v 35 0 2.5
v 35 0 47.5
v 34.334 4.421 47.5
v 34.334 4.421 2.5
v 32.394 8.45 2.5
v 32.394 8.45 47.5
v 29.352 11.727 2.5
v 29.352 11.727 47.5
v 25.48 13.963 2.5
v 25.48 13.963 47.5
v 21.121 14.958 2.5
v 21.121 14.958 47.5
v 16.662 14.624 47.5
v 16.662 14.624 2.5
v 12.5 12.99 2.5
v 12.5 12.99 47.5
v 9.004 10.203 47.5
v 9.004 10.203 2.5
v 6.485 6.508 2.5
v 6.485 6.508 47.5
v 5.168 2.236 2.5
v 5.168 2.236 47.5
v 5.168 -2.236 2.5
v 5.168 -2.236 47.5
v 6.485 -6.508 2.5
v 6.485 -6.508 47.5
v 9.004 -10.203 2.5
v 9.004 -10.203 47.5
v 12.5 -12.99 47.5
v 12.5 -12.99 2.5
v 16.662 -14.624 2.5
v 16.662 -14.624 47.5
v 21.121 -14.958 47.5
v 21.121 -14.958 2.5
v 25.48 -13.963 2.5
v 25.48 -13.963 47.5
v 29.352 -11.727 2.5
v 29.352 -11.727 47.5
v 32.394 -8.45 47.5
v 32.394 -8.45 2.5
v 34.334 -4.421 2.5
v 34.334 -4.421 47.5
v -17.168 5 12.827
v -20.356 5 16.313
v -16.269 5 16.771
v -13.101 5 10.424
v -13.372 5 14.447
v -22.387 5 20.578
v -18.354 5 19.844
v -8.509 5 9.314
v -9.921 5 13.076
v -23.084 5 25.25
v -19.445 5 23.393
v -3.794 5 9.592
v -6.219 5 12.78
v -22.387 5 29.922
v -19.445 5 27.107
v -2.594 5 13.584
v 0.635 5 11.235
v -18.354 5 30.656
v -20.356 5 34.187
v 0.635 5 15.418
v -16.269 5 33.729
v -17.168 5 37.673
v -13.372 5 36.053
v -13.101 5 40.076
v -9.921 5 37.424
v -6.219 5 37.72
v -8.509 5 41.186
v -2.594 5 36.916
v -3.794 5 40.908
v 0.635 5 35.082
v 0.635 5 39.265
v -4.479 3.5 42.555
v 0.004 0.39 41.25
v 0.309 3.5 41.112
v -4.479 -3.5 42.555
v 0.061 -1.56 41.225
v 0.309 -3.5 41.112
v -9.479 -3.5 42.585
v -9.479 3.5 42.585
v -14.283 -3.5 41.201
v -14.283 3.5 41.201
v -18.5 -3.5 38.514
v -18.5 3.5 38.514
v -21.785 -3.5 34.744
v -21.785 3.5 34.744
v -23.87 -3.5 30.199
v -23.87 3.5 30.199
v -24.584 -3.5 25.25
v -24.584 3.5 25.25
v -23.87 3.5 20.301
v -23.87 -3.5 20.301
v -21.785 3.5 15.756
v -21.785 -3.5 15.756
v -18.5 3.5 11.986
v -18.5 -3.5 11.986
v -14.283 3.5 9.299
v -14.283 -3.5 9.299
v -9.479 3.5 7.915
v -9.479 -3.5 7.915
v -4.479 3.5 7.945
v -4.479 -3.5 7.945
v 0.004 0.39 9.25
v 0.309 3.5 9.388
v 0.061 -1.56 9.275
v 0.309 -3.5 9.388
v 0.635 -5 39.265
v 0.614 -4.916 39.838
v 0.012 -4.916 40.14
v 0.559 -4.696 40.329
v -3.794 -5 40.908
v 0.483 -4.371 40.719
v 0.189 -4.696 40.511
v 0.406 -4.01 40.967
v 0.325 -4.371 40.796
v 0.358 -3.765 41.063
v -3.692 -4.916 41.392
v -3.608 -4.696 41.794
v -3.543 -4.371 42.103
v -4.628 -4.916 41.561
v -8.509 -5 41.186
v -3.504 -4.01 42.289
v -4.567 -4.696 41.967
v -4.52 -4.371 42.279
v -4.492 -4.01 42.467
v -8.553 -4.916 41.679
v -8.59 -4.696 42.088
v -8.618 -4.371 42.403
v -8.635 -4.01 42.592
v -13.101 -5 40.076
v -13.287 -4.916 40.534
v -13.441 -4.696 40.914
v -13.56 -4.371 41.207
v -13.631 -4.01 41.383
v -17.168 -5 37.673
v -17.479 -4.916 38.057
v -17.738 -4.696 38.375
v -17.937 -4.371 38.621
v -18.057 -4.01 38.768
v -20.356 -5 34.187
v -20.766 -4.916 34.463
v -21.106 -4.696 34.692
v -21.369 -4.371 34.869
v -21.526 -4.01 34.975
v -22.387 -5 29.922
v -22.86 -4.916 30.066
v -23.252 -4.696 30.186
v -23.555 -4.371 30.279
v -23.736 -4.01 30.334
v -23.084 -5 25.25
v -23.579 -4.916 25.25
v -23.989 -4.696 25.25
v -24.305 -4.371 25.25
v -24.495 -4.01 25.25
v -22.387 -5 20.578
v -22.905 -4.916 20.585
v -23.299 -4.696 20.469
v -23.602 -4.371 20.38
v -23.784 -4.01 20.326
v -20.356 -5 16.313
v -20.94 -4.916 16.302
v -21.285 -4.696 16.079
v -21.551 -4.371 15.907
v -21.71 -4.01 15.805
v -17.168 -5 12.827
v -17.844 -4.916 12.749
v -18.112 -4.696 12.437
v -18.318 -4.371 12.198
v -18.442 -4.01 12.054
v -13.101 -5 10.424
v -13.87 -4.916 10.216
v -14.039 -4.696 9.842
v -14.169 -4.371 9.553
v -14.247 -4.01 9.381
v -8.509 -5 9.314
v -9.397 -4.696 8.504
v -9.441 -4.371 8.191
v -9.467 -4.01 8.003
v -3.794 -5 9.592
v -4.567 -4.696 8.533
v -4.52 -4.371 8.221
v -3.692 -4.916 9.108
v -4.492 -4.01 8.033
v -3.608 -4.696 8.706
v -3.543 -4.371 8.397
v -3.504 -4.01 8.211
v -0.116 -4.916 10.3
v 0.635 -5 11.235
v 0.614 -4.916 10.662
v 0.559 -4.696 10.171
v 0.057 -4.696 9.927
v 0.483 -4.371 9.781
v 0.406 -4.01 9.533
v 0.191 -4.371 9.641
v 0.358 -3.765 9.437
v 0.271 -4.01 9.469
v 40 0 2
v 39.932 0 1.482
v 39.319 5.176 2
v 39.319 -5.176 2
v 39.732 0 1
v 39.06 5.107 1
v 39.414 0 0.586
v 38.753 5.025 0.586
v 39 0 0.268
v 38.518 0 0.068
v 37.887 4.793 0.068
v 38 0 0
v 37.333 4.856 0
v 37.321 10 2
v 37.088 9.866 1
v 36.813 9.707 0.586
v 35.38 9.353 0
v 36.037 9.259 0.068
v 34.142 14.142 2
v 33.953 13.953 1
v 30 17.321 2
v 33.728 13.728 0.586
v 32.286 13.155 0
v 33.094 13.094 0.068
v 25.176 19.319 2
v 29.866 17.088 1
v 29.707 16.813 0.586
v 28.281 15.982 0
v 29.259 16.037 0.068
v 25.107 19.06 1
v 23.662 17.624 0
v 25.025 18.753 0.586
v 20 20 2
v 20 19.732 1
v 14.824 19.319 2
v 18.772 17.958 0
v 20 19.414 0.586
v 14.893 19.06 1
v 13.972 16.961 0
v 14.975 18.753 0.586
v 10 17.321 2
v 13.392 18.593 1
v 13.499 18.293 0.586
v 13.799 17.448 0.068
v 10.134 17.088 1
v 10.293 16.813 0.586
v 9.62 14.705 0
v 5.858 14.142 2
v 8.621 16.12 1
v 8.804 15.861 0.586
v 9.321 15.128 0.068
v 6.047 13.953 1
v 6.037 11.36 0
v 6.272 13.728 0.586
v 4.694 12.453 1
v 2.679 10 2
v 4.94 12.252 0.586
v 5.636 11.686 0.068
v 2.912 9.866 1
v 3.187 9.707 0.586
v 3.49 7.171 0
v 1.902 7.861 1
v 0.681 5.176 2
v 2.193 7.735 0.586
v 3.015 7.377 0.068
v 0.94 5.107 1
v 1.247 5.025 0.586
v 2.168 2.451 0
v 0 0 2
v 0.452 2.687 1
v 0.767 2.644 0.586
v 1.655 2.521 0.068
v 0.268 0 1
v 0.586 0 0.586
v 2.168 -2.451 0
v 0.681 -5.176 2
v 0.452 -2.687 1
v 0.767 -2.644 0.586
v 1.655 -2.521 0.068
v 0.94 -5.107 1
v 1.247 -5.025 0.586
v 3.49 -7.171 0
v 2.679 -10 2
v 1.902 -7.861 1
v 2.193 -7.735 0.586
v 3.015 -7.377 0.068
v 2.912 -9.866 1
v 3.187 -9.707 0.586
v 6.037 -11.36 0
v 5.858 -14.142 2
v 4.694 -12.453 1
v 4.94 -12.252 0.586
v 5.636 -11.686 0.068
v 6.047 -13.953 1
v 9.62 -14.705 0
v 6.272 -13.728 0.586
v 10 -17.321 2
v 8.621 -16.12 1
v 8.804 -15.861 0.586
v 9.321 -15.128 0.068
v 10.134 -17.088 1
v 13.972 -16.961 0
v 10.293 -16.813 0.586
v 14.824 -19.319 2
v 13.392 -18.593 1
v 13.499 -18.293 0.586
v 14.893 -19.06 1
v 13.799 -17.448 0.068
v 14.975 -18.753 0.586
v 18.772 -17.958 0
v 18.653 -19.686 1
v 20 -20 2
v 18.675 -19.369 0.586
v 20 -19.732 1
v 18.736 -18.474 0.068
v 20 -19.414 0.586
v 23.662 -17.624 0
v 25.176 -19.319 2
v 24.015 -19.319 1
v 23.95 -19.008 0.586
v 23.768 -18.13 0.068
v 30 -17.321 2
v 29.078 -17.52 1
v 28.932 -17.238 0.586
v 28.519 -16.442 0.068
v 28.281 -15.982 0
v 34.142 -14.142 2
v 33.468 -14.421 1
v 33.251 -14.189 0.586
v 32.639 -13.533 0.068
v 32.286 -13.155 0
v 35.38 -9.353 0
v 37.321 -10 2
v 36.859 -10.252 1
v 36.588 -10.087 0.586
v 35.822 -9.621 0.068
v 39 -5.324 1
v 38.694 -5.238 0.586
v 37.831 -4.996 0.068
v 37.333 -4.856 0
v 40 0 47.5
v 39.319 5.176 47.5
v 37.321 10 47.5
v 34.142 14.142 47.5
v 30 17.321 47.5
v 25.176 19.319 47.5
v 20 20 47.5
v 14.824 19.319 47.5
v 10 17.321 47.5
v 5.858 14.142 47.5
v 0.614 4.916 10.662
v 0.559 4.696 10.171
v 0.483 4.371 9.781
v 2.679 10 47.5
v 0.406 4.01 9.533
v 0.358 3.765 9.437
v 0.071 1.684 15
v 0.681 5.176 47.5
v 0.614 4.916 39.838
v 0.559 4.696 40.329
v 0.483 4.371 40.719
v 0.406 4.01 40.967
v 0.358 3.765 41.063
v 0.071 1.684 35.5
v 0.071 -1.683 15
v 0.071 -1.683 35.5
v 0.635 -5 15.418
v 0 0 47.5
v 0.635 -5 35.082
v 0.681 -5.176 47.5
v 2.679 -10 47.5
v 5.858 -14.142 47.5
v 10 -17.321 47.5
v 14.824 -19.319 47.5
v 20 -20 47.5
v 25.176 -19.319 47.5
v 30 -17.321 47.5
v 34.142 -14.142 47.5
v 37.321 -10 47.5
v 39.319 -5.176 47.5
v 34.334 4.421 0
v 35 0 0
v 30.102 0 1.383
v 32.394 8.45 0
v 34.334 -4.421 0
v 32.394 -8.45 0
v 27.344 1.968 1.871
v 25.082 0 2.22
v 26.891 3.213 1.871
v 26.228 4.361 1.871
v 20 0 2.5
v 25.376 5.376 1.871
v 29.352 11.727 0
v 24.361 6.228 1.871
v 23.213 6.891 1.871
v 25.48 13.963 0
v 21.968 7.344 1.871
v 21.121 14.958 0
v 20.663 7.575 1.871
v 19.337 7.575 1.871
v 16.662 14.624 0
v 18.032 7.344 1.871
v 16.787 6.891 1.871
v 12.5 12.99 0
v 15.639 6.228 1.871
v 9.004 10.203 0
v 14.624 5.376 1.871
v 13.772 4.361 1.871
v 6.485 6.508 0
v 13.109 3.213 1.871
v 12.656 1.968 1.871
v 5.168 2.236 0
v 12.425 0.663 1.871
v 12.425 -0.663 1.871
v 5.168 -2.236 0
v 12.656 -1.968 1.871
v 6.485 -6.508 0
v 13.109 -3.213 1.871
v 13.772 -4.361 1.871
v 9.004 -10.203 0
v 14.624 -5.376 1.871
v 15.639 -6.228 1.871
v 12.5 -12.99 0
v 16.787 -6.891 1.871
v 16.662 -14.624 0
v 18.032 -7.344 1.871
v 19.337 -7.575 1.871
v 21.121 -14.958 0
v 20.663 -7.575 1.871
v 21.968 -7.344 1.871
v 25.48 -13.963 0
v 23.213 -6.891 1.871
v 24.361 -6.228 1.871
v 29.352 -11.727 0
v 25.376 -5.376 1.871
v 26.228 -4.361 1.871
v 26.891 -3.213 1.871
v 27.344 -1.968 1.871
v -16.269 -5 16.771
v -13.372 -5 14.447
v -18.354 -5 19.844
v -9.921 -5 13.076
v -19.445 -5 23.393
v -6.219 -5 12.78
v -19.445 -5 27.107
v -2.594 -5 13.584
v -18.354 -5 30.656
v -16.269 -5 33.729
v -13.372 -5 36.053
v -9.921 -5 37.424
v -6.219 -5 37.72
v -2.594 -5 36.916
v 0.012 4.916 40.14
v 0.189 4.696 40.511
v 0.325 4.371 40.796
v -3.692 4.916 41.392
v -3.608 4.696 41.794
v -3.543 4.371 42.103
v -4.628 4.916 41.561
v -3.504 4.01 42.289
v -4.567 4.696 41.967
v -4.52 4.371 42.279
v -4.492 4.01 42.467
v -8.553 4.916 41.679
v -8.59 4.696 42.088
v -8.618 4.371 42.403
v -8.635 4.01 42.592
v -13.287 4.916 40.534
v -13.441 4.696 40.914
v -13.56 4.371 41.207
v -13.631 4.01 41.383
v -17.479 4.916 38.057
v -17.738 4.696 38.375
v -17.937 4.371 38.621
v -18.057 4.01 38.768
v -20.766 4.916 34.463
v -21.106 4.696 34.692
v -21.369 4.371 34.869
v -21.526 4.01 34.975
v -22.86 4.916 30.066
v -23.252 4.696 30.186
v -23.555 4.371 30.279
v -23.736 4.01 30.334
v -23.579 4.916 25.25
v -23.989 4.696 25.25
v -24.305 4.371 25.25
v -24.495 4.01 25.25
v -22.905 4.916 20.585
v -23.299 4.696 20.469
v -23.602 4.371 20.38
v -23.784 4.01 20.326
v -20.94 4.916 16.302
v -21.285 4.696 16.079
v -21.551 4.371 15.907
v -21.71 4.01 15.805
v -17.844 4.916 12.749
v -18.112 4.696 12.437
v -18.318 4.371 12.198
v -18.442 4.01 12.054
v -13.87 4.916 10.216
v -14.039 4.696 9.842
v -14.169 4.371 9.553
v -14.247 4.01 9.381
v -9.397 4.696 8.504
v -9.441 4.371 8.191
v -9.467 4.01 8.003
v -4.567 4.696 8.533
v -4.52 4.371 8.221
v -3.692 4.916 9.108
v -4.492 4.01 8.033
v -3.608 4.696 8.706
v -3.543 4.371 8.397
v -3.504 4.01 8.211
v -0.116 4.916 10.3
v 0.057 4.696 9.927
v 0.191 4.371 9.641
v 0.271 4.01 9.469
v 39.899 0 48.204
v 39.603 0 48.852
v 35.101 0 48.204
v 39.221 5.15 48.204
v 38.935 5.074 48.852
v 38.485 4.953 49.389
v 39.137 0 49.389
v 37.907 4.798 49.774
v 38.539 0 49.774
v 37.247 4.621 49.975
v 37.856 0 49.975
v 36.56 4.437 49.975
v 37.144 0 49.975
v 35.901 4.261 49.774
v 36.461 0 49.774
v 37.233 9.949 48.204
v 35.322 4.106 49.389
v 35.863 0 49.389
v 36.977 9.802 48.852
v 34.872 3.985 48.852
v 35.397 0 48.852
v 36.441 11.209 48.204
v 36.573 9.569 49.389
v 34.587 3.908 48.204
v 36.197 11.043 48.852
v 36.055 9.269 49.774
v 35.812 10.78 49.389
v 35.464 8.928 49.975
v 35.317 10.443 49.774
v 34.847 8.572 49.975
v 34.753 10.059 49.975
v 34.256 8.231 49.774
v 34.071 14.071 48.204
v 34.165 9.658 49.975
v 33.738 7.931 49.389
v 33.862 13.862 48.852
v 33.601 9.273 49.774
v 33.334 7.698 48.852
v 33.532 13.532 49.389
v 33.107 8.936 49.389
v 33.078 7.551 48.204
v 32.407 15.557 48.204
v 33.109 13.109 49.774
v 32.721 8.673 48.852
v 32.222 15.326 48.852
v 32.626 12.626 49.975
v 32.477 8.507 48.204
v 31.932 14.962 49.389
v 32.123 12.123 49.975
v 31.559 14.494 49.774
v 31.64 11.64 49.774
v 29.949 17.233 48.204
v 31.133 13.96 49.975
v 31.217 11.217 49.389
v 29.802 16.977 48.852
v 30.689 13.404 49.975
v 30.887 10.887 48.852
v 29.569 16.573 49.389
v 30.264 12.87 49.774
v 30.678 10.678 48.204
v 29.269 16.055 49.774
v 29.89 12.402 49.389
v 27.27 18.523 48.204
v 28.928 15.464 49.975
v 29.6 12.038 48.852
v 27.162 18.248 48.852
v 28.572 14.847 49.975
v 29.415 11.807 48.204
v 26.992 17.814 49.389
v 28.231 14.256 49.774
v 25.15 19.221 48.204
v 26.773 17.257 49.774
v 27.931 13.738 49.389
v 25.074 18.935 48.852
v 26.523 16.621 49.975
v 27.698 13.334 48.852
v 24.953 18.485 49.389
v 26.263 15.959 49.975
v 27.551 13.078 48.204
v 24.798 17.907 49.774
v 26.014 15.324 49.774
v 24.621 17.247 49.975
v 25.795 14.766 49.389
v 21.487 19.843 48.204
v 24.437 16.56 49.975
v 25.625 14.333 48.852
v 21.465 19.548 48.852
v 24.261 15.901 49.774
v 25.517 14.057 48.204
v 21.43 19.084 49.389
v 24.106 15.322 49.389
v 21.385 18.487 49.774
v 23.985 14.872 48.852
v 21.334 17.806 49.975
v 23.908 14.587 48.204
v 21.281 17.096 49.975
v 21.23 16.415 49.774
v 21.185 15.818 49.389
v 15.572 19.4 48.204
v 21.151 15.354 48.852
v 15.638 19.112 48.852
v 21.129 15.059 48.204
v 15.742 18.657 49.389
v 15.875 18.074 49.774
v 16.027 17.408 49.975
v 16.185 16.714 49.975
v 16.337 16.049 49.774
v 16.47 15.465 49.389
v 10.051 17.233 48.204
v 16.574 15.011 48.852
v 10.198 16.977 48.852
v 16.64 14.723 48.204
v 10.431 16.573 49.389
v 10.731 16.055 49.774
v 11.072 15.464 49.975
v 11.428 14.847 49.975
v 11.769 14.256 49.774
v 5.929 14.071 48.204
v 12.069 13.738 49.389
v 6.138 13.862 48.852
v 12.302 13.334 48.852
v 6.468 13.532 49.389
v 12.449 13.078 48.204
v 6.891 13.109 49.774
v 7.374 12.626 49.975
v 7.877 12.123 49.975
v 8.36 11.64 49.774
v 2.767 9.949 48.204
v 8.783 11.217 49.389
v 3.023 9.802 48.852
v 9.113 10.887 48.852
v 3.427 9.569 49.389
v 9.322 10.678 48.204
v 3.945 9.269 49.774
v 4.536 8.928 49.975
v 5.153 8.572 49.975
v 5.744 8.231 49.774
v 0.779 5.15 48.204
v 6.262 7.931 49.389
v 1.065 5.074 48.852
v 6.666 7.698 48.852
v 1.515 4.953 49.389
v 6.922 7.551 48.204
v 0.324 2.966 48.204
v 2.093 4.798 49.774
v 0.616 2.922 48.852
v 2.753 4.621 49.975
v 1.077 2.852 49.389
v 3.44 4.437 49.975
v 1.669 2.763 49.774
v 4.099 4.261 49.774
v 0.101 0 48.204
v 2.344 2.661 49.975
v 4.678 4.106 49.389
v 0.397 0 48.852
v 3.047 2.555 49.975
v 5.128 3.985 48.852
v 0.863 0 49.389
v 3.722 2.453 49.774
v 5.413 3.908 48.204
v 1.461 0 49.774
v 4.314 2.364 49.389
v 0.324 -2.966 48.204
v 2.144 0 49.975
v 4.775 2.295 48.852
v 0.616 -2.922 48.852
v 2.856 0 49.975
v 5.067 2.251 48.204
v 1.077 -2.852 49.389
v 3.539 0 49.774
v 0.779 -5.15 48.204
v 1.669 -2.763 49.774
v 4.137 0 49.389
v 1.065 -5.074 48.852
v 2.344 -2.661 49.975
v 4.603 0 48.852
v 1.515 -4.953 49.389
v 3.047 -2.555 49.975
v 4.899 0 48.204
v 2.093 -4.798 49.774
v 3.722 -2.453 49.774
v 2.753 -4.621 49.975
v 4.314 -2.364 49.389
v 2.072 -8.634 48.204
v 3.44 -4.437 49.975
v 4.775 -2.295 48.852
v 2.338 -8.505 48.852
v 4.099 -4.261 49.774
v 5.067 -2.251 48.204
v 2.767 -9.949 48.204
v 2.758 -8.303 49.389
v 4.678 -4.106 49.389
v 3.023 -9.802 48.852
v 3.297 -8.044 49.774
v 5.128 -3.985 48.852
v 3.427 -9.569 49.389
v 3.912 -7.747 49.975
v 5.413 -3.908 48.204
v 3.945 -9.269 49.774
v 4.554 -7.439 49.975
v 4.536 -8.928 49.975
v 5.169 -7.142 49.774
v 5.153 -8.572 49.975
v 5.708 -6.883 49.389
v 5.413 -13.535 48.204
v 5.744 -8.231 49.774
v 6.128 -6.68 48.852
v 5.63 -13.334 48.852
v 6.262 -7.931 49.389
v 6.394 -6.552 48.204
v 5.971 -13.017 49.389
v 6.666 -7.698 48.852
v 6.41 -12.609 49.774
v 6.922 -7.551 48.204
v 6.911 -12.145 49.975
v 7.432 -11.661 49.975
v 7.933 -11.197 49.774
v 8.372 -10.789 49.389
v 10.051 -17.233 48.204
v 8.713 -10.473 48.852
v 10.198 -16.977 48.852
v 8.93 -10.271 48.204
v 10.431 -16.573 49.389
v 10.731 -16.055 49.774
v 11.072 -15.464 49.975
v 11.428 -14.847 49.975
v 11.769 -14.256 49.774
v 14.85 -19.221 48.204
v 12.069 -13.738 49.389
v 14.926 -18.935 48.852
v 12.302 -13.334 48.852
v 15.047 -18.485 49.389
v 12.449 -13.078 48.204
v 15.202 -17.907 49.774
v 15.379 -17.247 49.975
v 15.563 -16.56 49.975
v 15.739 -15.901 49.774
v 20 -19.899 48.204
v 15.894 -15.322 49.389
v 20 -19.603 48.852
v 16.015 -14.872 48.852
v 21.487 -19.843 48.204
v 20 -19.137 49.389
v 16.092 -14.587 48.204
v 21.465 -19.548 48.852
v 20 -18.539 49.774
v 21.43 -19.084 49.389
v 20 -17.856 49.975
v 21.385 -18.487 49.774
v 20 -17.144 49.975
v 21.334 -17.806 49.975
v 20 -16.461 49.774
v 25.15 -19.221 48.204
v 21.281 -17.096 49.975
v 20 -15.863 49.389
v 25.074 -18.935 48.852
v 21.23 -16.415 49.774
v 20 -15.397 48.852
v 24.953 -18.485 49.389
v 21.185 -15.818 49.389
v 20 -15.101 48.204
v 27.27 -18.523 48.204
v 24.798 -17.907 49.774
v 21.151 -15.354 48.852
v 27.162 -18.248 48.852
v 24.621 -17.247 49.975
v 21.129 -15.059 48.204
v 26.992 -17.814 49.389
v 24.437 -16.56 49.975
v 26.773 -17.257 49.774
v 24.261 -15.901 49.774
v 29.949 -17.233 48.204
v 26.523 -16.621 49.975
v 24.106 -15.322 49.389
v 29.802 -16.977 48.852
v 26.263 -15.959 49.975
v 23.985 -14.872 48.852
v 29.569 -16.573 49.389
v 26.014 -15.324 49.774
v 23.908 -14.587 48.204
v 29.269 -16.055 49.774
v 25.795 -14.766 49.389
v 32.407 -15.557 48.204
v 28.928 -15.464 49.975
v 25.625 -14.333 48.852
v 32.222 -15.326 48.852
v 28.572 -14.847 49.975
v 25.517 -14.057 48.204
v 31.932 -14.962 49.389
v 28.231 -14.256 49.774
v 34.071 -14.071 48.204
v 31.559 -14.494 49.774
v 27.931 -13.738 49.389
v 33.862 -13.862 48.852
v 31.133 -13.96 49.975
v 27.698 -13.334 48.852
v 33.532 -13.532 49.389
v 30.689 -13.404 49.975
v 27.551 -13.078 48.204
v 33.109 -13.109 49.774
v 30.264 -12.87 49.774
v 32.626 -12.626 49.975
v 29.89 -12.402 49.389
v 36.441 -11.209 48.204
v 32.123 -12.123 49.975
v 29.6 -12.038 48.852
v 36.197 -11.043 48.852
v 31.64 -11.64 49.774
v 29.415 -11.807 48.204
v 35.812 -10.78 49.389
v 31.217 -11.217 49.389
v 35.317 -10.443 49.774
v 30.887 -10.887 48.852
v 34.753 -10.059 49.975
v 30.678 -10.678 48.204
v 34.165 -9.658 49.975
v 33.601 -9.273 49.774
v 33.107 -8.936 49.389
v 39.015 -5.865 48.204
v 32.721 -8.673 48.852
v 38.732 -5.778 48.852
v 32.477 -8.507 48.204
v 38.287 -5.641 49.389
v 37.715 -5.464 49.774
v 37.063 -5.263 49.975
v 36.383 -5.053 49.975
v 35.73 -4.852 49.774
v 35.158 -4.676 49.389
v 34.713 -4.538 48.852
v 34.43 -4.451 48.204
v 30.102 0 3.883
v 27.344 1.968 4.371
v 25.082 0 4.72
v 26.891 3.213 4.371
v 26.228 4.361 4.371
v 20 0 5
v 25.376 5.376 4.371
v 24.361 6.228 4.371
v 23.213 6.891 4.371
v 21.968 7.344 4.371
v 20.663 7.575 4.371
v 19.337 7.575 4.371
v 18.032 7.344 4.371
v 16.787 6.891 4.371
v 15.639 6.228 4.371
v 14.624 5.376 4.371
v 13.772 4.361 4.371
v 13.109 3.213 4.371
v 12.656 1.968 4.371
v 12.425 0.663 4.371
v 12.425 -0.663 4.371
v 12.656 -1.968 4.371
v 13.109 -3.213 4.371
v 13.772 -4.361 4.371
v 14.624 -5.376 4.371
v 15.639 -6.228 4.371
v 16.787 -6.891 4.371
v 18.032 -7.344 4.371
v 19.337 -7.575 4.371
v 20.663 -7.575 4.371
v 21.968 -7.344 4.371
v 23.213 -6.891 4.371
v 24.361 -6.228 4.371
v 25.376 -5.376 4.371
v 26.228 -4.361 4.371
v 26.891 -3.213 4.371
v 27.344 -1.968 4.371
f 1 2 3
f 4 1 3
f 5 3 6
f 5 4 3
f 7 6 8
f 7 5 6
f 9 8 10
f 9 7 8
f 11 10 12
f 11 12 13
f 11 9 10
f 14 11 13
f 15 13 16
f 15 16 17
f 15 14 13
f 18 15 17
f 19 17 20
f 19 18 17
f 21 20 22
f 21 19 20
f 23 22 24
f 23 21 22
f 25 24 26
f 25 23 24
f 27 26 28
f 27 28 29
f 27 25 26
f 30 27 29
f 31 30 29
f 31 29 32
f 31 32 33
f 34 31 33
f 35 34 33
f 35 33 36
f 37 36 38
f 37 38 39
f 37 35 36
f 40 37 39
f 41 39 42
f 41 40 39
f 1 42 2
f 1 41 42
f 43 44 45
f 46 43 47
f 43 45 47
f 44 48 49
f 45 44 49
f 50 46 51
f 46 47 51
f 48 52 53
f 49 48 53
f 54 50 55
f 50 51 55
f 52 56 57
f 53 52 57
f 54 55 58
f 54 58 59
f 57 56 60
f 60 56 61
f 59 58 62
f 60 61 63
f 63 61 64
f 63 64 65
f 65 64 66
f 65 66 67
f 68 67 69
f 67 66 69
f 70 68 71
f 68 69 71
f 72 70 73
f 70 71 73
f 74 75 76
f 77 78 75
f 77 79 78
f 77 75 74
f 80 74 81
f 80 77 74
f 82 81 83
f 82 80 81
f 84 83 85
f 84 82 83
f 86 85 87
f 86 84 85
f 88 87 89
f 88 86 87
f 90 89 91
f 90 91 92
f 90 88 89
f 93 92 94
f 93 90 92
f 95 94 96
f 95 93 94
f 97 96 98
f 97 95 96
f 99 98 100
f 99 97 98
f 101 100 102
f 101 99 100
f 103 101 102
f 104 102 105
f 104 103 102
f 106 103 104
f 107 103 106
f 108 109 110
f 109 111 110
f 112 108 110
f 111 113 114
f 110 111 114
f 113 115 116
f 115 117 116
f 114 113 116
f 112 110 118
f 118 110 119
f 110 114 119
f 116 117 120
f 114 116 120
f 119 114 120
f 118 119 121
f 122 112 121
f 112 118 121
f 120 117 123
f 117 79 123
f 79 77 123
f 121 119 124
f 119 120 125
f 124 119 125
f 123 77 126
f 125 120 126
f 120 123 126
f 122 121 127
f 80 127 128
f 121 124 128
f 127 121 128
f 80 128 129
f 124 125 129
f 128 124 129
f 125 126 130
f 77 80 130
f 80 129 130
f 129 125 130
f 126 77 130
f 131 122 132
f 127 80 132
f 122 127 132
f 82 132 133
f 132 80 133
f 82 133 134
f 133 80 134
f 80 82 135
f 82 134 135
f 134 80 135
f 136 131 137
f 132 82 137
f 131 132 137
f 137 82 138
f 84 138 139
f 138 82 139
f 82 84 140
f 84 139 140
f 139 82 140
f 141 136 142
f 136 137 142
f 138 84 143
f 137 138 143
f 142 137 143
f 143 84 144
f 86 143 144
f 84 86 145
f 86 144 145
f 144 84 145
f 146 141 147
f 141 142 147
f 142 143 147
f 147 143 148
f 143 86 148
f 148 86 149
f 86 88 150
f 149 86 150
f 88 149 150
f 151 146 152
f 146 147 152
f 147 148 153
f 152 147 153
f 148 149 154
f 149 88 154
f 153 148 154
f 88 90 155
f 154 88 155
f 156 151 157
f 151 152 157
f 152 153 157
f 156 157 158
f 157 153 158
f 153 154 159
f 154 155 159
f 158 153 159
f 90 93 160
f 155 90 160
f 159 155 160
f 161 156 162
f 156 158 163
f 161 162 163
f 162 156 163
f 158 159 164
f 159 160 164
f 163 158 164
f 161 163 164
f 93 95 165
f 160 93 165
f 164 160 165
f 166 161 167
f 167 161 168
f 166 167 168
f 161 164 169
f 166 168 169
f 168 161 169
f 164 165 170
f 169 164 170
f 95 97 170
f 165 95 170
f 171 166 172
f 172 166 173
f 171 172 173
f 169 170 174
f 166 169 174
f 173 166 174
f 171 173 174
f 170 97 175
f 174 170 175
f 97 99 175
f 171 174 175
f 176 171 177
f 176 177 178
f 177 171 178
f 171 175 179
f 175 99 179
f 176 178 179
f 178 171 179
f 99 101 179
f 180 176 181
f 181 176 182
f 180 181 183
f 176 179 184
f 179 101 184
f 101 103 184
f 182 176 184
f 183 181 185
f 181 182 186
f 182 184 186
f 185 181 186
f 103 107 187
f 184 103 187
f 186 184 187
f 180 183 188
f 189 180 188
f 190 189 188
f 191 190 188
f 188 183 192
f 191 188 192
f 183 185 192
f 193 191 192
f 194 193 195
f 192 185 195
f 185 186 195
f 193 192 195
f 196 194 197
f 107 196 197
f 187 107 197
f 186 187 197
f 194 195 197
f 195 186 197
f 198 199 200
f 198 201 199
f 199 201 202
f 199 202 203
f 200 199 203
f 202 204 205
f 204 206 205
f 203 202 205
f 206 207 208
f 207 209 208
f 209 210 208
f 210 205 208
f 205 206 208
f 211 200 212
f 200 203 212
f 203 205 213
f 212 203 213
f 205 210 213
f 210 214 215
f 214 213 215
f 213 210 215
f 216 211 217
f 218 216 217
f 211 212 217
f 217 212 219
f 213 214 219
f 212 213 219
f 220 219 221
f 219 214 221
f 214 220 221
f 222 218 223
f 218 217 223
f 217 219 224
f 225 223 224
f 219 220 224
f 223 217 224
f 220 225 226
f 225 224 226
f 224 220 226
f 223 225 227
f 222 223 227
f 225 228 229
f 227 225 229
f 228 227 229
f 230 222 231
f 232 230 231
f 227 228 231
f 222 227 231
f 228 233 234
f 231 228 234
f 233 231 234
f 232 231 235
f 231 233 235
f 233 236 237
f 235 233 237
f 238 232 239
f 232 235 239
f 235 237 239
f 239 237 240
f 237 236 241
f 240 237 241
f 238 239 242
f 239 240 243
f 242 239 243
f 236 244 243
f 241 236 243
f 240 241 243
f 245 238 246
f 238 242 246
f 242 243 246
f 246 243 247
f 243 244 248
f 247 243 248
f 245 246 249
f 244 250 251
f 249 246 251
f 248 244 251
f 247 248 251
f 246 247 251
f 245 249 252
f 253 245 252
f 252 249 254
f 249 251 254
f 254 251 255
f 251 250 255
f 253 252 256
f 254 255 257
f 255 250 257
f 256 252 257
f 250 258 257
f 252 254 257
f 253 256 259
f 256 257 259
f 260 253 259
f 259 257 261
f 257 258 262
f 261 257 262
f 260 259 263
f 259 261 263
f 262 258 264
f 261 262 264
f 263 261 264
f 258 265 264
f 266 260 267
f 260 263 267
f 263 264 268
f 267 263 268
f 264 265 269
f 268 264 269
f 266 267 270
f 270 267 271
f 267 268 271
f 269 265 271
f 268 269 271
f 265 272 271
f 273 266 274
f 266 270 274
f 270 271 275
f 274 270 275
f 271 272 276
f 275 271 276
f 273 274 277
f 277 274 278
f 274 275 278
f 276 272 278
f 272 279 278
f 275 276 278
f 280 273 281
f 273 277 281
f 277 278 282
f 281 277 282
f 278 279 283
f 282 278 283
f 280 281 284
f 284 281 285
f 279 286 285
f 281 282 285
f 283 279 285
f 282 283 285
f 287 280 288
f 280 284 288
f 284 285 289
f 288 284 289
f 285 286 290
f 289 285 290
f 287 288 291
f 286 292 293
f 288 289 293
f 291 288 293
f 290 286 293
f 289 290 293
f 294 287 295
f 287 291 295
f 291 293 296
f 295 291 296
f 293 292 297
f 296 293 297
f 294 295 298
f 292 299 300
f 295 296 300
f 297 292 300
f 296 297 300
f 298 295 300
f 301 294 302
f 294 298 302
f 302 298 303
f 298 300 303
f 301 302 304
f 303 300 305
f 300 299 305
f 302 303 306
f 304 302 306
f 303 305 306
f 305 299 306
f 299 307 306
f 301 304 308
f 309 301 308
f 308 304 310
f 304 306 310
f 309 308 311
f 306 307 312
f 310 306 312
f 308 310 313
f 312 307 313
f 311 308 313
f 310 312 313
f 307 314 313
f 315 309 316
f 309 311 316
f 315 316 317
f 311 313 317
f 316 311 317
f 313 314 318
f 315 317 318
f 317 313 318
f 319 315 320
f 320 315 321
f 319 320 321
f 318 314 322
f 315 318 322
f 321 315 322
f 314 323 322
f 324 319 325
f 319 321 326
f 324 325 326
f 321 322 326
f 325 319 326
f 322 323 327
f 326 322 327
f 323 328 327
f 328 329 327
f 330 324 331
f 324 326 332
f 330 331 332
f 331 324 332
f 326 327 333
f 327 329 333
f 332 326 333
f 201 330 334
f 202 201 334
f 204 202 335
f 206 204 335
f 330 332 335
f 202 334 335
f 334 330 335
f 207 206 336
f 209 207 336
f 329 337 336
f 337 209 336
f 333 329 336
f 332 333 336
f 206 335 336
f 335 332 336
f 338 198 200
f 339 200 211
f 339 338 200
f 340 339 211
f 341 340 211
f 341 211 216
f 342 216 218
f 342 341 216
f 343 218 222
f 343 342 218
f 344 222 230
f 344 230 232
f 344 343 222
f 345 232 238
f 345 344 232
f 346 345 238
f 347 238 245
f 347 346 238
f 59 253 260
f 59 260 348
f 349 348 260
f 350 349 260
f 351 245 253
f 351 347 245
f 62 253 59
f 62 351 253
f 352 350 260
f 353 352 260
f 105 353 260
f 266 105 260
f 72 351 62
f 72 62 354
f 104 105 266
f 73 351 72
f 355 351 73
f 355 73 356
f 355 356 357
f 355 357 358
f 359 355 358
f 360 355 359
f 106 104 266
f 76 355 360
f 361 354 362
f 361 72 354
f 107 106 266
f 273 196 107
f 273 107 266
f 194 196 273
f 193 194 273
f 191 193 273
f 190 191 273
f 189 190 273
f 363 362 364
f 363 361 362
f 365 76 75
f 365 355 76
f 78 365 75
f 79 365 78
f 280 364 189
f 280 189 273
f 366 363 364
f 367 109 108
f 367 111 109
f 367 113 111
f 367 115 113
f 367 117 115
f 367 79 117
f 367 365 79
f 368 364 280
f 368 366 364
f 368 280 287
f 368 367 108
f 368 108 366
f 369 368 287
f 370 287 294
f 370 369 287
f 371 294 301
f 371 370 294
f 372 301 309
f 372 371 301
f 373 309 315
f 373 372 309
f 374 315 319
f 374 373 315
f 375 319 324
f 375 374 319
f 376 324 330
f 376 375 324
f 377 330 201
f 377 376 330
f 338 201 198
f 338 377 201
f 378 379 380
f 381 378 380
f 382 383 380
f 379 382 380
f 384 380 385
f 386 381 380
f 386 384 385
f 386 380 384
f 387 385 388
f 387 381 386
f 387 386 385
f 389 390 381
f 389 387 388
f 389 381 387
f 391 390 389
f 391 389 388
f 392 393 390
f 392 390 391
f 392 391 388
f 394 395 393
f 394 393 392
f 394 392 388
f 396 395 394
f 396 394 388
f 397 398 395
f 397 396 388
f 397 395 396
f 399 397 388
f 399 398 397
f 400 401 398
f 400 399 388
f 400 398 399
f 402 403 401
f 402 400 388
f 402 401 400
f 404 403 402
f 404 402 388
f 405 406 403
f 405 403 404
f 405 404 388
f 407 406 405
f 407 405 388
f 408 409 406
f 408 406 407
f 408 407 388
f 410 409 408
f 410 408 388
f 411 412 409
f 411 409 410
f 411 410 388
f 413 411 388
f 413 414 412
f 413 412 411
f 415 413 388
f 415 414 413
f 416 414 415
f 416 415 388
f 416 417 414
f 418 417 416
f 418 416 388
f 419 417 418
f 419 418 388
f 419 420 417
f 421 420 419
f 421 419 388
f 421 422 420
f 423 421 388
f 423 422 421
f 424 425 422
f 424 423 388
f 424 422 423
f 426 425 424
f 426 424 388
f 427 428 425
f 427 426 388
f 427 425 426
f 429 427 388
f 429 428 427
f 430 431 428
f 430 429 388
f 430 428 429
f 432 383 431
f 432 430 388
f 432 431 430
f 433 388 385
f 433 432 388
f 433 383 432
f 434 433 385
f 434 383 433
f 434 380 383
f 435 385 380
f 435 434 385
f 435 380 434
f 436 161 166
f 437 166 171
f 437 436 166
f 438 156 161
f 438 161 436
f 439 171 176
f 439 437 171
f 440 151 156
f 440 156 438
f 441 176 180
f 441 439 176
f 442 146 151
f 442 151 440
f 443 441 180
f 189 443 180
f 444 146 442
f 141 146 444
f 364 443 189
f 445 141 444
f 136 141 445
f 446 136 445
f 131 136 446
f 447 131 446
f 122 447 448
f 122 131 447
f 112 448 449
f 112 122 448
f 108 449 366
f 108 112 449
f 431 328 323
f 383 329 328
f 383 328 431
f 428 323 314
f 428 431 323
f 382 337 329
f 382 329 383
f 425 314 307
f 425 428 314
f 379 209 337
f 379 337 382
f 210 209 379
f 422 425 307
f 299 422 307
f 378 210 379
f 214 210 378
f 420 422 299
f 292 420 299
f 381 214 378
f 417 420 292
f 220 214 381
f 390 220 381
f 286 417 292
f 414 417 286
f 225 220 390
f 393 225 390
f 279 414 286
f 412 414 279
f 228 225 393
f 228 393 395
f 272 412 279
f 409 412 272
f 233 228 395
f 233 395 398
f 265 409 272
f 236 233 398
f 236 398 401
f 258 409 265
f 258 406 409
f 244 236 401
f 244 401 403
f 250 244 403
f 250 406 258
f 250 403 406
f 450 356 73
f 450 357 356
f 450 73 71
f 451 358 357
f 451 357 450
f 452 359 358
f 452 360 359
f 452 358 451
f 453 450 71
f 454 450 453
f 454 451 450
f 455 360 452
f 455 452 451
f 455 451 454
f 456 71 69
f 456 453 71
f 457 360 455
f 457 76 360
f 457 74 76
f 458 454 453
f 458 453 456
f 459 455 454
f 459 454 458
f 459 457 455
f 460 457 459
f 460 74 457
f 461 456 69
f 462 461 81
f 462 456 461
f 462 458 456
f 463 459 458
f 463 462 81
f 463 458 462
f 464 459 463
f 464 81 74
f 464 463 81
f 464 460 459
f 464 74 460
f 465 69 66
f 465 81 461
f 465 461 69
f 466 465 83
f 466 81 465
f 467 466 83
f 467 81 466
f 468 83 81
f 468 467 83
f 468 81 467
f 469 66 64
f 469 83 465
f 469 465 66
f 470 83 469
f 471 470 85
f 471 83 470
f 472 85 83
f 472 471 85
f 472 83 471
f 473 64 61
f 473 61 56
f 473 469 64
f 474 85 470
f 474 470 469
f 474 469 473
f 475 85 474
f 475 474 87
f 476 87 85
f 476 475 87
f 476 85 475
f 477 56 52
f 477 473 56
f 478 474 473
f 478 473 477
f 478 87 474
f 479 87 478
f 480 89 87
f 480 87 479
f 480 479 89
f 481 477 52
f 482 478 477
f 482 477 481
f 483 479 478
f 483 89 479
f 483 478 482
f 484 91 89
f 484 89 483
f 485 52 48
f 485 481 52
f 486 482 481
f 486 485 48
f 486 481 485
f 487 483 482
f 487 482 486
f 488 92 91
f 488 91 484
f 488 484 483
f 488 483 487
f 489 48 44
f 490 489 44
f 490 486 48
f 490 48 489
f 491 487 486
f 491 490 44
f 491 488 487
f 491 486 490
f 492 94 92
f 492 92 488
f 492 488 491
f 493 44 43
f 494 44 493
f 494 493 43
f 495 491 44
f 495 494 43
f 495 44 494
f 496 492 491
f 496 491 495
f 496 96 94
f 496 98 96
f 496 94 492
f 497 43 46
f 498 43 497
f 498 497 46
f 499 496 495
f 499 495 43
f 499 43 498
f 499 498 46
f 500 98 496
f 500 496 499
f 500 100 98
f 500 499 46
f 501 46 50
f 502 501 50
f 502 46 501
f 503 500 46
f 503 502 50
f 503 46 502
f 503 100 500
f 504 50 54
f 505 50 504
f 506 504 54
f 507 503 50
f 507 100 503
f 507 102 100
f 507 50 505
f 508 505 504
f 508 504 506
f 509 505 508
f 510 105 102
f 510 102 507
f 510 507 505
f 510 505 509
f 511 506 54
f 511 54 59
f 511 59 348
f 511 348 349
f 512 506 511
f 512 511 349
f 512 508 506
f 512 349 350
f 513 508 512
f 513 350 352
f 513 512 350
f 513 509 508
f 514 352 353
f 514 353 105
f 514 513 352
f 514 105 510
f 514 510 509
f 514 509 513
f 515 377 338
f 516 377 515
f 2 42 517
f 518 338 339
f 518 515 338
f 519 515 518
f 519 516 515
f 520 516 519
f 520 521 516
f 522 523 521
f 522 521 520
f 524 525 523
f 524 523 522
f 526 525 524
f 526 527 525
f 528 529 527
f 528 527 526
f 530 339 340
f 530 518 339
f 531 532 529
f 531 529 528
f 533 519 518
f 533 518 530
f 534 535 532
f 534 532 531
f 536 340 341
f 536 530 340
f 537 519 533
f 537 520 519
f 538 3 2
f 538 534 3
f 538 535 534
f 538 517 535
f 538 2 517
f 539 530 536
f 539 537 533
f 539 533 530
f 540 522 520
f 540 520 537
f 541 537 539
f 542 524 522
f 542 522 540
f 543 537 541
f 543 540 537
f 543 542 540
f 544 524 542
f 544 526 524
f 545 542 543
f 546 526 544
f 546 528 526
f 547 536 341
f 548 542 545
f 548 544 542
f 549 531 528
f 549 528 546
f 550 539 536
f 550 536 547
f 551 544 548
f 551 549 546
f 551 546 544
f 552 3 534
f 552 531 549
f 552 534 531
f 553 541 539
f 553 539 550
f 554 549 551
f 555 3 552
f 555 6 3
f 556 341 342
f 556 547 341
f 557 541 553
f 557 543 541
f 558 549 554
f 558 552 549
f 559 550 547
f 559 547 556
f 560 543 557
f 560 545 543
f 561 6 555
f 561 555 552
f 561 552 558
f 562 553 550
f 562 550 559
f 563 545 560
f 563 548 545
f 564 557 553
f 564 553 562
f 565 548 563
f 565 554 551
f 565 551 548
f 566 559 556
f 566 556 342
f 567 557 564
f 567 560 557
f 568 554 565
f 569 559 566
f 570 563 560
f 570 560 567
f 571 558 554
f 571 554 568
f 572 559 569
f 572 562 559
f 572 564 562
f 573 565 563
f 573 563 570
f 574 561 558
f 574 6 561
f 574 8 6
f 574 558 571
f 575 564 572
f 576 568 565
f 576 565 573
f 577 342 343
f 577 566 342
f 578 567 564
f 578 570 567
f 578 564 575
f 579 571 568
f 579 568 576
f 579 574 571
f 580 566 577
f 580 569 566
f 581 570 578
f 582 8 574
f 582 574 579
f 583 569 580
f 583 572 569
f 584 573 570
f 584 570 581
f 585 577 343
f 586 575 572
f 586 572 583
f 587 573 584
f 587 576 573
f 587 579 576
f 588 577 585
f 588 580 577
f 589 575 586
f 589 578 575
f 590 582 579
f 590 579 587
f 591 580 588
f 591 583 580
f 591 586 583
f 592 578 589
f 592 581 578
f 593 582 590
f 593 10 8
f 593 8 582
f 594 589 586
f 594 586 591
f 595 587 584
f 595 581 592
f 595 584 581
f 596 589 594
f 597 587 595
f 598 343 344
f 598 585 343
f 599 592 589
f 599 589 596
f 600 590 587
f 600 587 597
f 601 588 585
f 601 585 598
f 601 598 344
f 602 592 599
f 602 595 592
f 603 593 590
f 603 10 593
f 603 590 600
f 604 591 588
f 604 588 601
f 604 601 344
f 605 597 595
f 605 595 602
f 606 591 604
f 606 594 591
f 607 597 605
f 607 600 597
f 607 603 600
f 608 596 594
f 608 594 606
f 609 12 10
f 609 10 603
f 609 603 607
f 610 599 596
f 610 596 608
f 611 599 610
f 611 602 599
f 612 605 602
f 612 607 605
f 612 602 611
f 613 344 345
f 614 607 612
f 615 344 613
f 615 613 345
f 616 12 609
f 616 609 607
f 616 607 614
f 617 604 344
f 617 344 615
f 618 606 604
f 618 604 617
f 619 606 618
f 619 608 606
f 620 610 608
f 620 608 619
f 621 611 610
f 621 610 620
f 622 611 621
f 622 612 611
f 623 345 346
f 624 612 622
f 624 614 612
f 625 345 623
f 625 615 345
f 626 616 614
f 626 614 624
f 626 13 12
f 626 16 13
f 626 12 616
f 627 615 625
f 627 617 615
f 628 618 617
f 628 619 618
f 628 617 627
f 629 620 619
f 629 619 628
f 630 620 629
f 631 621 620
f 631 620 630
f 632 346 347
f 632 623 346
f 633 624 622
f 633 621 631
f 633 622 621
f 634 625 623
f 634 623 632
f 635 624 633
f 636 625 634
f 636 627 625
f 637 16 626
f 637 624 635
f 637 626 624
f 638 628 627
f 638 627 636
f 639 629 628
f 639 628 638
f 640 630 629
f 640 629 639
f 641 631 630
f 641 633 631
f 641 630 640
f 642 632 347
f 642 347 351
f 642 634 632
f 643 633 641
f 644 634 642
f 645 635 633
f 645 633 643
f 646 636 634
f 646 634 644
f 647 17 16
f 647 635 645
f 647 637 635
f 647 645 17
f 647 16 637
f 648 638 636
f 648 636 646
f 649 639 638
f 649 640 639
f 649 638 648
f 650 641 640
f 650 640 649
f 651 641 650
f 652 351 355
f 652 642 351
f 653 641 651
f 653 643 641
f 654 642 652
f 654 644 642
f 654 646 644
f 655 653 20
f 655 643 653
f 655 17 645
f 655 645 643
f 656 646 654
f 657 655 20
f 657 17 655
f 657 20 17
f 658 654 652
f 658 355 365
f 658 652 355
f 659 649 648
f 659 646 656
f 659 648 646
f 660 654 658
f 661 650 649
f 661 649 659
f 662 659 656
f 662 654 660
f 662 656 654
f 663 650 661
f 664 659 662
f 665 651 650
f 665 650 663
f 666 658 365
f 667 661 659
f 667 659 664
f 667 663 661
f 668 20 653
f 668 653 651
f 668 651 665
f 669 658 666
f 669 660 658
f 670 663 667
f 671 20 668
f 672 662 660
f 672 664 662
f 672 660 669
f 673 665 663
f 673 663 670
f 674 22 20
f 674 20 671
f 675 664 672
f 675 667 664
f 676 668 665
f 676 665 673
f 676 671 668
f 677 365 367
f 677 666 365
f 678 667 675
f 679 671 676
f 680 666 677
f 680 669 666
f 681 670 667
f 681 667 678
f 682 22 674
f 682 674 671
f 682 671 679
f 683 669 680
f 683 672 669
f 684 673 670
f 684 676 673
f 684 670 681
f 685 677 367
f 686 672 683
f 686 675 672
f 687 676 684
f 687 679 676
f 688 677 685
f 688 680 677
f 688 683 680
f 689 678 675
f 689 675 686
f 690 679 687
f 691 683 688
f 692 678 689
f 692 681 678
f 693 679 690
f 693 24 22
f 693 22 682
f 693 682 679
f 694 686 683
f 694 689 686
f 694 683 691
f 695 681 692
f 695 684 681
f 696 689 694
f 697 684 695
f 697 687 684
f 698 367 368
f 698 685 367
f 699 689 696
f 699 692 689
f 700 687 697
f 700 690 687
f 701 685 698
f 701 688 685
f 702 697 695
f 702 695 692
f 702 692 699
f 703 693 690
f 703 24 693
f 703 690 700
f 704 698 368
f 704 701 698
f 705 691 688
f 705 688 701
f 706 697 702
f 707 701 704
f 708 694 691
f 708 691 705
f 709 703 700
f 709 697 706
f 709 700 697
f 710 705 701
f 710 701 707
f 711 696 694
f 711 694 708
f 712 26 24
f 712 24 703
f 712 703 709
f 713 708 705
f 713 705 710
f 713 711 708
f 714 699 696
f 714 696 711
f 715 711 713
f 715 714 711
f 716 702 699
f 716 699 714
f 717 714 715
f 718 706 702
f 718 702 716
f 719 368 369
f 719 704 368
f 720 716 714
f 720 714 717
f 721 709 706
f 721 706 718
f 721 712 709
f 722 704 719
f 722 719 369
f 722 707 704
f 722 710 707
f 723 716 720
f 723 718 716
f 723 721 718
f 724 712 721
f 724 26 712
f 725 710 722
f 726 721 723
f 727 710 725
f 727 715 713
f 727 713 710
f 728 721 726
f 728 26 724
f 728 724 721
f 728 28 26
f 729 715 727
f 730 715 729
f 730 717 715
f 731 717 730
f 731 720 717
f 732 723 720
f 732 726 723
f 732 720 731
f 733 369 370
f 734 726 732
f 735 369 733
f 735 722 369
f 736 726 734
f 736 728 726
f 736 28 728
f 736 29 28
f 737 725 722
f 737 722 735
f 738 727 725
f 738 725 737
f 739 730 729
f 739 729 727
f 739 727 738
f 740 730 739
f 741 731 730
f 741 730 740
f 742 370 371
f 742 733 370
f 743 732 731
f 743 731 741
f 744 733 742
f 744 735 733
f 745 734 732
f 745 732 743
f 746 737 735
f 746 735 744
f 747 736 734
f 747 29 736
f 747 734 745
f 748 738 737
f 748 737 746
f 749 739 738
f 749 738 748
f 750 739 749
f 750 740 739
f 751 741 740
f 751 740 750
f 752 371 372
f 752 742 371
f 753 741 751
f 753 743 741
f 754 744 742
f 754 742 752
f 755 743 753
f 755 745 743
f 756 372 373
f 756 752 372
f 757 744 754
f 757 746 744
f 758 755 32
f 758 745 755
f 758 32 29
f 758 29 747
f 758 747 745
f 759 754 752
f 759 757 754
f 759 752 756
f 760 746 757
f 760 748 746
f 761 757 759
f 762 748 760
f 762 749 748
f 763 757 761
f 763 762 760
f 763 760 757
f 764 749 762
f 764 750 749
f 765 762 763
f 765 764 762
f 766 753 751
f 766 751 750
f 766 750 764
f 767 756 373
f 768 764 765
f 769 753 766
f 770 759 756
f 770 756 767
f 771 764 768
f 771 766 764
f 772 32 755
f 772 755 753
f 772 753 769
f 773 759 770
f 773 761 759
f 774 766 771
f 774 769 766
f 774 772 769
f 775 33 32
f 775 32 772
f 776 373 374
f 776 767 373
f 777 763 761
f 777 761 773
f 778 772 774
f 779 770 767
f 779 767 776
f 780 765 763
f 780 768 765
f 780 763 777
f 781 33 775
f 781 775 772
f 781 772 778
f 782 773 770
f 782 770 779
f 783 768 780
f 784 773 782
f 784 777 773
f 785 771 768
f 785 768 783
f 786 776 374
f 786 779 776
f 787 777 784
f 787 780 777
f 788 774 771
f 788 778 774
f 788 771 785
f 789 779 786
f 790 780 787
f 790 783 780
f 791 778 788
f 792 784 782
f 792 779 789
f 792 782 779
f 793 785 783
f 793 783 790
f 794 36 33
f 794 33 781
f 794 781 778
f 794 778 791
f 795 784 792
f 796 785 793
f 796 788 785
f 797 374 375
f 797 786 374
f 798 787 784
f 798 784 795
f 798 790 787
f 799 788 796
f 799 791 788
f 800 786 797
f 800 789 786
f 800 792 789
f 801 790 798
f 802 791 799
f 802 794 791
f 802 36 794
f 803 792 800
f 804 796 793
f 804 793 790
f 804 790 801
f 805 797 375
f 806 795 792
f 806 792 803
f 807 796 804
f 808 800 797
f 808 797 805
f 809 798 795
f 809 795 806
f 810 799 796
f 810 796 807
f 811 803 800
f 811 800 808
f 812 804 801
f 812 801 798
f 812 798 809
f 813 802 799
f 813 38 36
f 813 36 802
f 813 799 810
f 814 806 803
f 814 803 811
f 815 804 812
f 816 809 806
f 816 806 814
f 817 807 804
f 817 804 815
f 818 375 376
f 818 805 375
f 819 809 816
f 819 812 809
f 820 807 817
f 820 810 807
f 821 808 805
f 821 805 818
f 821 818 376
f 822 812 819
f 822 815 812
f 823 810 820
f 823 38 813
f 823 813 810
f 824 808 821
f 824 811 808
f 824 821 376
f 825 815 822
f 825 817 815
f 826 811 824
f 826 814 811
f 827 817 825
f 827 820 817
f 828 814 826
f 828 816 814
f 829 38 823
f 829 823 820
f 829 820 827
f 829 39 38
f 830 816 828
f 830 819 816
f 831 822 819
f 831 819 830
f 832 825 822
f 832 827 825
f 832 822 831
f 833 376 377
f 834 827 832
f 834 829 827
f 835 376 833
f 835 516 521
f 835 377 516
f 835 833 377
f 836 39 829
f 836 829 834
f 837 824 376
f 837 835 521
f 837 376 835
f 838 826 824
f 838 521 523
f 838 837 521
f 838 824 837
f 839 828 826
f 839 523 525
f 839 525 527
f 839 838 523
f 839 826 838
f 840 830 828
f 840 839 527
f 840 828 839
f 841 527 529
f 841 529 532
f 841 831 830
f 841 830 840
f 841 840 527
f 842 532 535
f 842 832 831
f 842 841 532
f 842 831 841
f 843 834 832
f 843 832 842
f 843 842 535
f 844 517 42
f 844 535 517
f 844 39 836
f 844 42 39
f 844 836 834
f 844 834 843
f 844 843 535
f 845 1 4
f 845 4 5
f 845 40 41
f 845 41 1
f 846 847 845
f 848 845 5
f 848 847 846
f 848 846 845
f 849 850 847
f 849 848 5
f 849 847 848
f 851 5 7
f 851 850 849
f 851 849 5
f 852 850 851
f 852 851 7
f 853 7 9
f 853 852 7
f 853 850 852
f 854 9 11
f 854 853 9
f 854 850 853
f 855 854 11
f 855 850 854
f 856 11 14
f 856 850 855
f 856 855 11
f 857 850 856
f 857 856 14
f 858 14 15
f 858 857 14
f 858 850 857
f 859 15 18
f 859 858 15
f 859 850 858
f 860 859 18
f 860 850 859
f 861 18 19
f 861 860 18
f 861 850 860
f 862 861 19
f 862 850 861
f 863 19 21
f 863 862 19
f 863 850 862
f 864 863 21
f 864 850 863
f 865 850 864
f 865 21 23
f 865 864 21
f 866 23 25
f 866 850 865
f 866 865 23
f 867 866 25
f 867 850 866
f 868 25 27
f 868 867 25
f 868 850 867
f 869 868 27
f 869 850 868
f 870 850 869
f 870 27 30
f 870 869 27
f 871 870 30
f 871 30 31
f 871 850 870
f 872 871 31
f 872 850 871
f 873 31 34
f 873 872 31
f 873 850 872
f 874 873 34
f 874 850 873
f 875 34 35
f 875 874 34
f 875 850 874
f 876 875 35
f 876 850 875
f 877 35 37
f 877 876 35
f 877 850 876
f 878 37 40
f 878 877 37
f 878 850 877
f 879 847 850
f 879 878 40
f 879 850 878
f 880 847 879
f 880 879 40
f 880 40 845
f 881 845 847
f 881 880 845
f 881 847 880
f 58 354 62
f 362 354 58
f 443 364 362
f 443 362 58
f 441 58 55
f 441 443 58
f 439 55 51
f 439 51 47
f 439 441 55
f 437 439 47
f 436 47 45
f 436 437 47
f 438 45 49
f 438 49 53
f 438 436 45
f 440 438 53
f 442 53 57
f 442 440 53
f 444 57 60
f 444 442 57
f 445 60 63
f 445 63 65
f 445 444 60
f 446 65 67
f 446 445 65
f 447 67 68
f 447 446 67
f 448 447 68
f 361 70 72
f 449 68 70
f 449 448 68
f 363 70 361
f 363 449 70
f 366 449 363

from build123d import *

# Parameters (mm, degrees)
F3_DEPTH = 5
F4_R     = 1.5
F5_R     = 2


# Not quite as in the source:
# - a feature names something its author has since deleted; it is built from what else it names


with BuildPart() as f1:
    # F0 (on Front) → F1 (revolve)
    with BuildSketch(Plane.XZ):
        Polygon((35, 0), (40, 0), (40, 47.5), (35, 47.5), (35, 2.5), align=None)
        with BuildLine():
            Line((35, 47.5), (40, 47.5))
            ThreePointArc((40, 47.5), (37.5, 50), (35, 47.5))
        make_face()
        with BuildLine():
            ThreePointArc((20, 2.5), (27.6034531629, 1.8707189772), (35, 0))
            Line((35, 0), (35, 2.5))
            ThreePointArc((35, 2.5), (27.6034531629, 4.3707189772), (20, 5))
            Line((20, 5), (20, 2.5))
        make_face()
    revolve(axis=Axis((20, 0, 1.25), (0, 0, 1)))

    # F2 (on Front) → F3 (join, symmetric)
    with BuildSketch(Plane.XZ):
        with BuildLine():
            ThreePointArc((1.5, 16.1636090773), (-19.5841423567, 25.25), (1.5, 34.3363909227))
            Line((1.5, 34.3363909227), (1.5, 40.5))
            ThreePointArc((1.5, 40.5), (-24.5841423567, 25.25), (1.5, 10))
            Line((1.5, 10), (1.5, 16.1636090773))
        make_face()
    extrude(amount=F3_DEPTH, both=True)

    # F4
    f4_edges = [f1.edges().sort_by_distance(p)[0] for p in [
        (-24.584142, 5, 25.25),
        (-24.584142, -5, 25.25),
    ]]
    fillet(f4_edges, radius=F4_R)

    # F5
    f5_edges = [f1.edges().sort_by_distance(p)[0] for p in [
        (0, 0, 0),
    ]]
    fillet(f5_edges, radius=F5_R)


solid = f1.part
